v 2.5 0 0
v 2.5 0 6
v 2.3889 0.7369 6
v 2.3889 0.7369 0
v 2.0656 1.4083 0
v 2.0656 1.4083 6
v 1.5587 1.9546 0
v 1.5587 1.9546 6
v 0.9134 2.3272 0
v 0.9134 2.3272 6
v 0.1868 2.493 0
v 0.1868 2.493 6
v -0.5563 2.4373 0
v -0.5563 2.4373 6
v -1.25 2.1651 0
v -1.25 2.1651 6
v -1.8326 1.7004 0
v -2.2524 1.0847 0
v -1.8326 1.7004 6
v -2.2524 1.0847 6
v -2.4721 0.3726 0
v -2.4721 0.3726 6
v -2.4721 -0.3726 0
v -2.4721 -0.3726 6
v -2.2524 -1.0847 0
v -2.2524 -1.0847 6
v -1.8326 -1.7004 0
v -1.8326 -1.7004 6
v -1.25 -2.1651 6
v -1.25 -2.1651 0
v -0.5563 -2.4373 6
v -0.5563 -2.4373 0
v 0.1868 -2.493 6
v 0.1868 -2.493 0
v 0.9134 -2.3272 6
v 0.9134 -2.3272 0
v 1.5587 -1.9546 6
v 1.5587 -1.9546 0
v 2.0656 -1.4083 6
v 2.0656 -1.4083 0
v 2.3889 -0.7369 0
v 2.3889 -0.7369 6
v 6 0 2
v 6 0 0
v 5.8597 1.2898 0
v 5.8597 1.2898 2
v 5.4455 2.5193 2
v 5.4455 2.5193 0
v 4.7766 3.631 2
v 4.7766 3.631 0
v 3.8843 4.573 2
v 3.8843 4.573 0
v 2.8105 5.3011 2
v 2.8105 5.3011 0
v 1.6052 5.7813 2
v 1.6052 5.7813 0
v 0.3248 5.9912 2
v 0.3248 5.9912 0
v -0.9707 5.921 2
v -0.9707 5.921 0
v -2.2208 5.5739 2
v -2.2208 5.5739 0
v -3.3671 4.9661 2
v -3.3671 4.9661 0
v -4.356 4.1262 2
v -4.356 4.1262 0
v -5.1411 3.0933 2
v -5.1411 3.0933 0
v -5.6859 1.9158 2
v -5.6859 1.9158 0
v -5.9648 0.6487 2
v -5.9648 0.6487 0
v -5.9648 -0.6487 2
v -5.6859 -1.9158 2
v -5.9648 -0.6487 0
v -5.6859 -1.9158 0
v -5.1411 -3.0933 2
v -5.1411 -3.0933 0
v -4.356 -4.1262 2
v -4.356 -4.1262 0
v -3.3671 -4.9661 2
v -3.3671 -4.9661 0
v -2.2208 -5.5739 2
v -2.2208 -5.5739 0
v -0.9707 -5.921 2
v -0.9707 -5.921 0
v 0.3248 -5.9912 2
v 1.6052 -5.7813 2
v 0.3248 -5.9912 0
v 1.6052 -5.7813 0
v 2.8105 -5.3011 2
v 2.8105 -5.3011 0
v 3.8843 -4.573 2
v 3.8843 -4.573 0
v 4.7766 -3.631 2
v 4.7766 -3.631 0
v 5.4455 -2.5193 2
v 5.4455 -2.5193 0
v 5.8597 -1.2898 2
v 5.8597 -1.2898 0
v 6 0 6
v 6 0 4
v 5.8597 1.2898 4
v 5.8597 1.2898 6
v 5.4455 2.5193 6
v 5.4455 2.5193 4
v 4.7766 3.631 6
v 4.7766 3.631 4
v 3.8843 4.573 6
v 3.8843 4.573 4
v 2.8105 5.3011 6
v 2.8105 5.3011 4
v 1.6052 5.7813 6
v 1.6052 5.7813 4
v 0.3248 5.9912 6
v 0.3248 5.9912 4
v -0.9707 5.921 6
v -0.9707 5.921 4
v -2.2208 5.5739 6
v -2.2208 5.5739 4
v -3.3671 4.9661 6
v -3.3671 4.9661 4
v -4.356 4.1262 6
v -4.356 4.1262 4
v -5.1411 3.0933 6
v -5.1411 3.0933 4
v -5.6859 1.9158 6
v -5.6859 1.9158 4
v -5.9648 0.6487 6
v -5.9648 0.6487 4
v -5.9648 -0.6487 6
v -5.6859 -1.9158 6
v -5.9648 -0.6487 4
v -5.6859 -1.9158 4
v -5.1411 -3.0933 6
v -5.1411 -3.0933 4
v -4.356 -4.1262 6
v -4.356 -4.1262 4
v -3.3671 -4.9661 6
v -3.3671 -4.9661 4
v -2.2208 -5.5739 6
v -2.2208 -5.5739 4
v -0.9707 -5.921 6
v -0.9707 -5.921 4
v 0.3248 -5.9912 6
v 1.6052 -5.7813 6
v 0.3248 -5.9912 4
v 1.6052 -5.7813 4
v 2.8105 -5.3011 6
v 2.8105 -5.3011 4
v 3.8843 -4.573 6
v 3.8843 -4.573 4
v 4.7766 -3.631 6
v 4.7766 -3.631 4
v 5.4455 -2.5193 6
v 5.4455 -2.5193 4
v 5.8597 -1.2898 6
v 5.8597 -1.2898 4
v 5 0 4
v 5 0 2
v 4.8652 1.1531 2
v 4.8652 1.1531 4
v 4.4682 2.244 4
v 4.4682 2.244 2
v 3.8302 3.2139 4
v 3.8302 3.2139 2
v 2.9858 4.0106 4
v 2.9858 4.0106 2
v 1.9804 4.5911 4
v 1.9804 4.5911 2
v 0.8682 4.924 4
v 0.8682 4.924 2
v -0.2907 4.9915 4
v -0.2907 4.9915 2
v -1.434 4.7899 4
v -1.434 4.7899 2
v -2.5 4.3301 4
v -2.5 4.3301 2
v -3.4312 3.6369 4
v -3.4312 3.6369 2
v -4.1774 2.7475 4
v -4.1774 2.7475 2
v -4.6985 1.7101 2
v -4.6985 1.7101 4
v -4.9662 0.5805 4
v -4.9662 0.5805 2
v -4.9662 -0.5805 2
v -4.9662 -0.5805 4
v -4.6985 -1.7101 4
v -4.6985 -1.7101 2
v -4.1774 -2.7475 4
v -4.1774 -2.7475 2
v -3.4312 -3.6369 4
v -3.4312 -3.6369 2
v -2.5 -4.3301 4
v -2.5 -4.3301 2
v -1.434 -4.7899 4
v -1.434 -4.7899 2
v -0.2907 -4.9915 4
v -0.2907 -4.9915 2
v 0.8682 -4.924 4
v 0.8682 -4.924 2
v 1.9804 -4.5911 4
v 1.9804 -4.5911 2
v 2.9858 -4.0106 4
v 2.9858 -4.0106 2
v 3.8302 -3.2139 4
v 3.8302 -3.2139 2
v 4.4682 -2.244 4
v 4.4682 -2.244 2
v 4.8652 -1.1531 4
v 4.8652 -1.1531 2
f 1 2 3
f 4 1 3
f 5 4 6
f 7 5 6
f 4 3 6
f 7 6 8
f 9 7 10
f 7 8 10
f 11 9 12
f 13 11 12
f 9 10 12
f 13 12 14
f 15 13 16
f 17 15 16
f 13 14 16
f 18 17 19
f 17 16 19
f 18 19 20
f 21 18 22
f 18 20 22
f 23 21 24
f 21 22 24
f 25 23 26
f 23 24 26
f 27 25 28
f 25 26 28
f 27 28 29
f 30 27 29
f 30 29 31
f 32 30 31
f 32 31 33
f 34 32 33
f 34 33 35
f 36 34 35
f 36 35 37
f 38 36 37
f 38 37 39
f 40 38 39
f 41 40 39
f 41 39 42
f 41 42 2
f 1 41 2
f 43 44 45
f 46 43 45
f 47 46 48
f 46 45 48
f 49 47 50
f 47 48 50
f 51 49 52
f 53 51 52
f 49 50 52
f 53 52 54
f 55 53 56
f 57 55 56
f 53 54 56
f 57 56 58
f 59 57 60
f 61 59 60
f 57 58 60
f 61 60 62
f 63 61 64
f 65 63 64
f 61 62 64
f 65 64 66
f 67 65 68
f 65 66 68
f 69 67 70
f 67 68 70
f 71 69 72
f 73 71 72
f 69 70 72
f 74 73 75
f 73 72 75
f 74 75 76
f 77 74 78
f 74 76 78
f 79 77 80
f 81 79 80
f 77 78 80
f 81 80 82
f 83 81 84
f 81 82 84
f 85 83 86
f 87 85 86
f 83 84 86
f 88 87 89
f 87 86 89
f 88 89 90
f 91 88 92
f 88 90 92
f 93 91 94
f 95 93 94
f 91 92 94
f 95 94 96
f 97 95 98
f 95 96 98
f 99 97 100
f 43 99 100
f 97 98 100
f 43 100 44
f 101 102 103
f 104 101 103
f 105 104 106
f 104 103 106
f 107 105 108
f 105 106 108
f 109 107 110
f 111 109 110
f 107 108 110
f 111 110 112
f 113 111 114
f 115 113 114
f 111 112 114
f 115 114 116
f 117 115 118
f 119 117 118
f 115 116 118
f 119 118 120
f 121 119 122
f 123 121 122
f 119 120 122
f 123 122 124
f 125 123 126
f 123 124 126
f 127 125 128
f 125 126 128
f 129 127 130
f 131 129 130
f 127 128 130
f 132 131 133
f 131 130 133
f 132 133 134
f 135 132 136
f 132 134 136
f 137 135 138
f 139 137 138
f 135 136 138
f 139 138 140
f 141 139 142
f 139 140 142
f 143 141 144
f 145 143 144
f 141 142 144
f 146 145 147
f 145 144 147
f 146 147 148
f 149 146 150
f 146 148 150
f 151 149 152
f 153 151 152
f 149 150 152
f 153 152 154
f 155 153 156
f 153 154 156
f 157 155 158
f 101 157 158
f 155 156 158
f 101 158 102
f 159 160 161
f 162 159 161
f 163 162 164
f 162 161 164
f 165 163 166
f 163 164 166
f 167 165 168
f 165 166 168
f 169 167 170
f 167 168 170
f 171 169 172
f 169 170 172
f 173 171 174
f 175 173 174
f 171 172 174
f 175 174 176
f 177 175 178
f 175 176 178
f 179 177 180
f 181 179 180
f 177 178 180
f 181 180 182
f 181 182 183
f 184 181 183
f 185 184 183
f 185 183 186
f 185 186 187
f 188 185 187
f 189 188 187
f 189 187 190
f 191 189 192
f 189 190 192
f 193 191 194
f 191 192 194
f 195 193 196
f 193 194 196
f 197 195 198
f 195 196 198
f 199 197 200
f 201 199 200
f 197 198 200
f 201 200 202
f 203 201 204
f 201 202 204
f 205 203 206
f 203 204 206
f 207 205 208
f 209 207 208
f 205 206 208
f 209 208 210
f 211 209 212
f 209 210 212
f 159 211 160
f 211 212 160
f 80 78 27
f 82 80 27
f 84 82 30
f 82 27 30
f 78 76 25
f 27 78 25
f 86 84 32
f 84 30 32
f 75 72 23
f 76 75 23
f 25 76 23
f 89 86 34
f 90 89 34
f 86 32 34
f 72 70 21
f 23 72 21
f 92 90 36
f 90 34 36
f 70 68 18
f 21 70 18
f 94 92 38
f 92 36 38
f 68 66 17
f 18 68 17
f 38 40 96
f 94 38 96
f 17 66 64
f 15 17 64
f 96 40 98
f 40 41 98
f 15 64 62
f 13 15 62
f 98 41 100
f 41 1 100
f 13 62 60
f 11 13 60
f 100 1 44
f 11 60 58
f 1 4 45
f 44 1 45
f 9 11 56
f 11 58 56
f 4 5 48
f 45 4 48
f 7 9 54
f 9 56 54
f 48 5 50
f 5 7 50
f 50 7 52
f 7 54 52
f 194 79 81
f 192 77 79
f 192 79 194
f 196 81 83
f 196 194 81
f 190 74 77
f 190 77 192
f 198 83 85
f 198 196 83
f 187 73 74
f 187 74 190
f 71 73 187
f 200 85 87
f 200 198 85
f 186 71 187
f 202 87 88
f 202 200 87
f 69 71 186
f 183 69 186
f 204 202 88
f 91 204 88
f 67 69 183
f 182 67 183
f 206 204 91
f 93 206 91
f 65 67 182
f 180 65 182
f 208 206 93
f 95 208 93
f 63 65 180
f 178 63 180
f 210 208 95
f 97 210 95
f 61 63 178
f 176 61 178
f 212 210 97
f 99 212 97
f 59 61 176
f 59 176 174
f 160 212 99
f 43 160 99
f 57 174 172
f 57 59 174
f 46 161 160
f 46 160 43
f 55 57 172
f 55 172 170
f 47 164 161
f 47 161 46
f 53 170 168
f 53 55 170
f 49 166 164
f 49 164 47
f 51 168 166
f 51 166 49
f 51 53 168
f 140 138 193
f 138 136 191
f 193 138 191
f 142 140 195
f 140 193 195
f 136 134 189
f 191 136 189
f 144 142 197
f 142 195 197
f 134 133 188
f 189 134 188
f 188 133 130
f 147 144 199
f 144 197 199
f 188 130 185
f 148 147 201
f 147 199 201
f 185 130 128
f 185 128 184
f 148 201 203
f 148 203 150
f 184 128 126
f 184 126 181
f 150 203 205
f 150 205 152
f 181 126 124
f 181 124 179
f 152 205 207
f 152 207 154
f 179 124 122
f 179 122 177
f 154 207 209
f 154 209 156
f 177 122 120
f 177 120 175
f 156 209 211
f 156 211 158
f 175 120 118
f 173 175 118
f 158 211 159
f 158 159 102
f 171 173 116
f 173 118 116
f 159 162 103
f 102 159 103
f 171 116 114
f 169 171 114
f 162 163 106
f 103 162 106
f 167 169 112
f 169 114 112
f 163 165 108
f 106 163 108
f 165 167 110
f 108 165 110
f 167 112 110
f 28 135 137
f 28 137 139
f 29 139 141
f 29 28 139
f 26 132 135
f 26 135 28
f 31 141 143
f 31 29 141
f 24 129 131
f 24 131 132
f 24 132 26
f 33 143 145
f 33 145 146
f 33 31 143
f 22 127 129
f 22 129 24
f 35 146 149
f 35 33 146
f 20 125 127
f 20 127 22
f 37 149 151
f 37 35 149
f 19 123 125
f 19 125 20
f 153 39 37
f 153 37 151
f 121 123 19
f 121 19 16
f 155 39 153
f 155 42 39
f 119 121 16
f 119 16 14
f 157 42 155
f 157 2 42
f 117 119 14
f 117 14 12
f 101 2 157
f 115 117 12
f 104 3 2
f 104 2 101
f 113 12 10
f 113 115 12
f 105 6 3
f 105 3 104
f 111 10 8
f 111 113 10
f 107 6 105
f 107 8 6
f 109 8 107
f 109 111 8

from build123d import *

# Parameters (mm, degrees)
SKETCH_R     = 6
PAD_DEPTH    = 2
SKETCH001_R  = 5
PAD001_DEPTH = 2
SKETCH002_R  = 6
PAD002_DEPTH = 2
SKETCH003_R  = 2.5
POCKET_DEPTH = 6.001


with BuildPart() as part:
    # Sketch → Pad (new body)
    with BuildSketch(Plane.XY):
        Circle(SKETCH_R)
    extrude(amount=PAD_DEPTH)

    # Sketch001 (on Face3 of Pad) → Pad001 (join)
    with BuildSketch(Plane.XY.offset(2)):
        Circle(SKETCH001_R)
    extrude(amount=PAD001_DEPTH)

    # Sketch002 (on Face5 of Pad001) → Pad002 (join)
    with BuildSketch(Plane.XY.offset(4)):
        Circle(SKETCH002_R)
    extrude(amount=PAD002_DEPTH)

    # Sketch003 (on Face3 of Pad002) → Pocket (cut, through all)
    with BuildSketch(Plane.XY.offset(6)):
        Circle(SKETCH003_R)
    extrude(amount=-POCKET_DEPTH, mode=Mode.SUBTRACT)


solid = part.part
